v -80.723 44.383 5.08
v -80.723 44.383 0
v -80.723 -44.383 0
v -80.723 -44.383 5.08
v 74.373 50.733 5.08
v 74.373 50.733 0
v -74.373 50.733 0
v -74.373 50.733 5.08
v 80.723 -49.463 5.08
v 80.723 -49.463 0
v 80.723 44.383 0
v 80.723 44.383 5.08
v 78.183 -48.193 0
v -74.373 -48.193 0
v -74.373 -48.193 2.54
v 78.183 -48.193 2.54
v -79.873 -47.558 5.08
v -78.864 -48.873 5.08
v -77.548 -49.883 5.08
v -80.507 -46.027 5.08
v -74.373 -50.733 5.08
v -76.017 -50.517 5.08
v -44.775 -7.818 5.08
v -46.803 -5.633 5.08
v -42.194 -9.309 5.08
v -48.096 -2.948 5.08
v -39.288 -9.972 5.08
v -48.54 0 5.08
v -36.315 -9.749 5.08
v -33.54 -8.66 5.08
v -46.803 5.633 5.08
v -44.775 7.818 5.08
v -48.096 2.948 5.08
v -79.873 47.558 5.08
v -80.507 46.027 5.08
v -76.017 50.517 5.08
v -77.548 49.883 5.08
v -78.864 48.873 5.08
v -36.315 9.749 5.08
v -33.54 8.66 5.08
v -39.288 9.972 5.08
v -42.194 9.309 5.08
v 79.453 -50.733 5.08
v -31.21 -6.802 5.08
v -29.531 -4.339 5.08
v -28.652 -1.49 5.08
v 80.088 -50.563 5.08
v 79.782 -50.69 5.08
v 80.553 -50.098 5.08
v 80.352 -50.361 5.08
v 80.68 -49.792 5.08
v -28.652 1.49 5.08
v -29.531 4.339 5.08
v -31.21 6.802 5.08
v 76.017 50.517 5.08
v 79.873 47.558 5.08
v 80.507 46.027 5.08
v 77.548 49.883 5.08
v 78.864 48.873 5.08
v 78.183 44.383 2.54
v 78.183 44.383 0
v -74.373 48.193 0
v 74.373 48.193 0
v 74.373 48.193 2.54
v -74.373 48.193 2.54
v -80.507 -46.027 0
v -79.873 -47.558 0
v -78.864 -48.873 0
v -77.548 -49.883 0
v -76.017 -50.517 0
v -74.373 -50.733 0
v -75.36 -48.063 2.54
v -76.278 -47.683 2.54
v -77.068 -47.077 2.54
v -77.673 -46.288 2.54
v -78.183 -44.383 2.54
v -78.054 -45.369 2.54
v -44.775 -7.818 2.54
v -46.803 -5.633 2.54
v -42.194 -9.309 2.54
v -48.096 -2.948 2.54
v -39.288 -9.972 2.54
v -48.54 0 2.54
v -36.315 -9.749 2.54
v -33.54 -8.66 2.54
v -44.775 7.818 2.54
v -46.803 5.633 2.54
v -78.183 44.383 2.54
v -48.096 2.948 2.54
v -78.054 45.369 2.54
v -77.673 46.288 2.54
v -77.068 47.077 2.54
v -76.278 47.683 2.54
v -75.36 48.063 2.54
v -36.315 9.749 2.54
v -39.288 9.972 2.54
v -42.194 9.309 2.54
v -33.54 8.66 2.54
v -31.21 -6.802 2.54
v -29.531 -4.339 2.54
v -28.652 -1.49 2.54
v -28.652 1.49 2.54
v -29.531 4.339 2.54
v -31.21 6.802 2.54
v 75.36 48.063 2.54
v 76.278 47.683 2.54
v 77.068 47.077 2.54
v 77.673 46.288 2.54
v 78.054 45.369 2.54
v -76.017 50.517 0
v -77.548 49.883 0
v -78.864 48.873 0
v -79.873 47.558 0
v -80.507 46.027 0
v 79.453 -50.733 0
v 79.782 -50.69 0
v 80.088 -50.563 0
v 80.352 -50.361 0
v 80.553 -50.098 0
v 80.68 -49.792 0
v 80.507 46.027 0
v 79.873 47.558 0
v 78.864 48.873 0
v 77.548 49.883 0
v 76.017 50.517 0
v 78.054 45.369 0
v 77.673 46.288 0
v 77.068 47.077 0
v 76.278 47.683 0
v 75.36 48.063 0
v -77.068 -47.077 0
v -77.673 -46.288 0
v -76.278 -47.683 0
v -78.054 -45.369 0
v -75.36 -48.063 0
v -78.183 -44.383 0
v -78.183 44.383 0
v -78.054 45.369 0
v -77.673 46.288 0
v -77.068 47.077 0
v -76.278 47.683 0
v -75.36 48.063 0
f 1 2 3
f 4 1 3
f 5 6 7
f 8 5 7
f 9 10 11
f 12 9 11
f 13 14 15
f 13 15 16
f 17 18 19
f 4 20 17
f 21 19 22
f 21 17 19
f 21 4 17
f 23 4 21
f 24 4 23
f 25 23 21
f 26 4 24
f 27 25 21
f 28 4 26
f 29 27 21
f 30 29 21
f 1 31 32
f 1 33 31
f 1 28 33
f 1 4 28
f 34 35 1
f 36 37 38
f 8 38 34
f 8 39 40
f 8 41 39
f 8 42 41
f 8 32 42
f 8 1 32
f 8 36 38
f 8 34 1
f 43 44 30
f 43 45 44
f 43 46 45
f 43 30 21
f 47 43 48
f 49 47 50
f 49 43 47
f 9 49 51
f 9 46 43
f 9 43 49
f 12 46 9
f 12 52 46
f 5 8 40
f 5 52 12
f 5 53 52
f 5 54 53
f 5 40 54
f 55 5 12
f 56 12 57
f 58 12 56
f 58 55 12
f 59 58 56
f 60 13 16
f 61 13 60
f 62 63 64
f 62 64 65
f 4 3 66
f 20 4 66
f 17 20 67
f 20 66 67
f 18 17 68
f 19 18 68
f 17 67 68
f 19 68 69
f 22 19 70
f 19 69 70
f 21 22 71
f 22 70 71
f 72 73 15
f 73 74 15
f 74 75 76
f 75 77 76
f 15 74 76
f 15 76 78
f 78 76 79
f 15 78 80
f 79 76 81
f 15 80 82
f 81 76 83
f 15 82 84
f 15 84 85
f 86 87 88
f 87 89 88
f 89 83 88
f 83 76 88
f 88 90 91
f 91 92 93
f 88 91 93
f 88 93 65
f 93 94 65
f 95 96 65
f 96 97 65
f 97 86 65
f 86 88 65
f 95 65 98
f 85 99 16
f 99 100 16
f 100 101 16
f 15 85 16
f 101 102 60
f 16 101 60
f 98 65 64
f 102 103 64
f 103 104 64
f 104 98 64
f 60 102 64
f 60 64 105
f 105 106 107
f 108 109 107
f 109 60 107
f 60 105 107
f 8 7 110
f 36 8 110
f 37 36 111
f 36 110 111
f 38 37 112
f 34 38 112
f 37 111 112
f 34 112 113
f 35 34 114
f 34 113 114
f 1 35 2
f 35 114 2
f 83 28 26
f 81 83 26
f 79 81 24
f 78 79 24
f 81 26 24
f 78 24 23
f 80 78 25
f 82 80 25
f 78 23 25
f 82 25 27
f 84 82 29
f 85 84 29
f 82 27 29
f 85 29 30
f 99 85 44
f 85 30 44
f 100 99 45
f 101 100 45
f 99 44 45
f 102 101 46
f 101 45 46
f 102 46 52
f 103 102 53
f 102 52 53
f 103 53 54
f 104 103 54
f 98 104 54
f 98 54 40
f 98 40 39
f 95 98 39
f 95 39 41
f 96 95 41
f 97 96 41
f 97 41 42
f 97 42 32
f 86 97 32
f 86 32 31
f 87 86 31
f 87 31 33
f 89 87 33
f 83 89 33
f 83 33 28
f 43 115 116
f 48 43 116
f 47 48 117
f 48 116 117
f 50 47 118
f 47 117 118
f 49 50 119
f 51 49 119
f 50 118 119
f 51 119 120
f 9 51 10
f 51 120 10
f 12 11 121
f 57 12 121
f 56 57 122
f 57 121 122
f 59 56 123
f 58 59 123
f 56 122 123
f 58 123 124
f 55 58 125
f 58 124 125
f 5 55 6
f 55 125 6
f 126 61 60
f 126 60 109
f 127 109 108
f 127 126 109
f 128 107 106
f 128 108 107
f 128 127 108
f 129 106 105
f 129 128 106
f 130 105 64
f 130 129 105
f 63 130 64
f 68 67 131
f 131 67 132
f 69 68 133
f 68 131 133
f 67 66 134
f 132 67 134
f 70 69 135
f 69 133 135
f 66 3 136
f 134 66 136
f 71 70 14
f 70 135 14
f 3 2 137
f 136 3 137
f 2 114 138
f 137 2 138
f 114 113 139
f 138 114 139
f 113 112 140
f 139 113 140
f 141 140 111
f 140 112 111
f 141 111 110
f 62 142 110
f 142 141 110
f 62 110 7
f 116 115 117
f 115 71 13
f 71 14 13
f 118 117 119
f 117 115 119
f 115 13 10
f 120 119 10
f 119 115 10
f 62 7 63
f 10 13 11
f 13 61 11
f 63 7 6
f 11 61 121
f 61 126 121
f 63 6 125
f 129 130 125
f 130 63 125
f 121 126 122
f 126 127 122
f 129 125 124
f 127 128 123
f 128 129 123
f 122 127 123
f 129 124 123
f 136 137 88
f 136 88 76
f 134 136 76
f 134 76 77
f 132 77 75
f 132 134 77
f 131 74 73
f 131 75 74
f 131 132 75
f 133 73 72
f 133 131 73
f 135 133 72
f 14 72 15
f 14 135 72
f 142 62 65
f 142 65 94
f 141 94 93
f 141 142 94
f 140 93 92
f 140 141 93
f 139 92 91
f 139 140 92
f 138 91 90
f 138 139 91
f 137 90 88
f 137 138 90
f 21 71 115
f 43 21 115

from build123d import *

# Parameters (mm, degrees)
F1_DEPTH = 5.08
F2_T     = -2.54
F4_D     = 20


with BuildPart() as f1:
    # F0 (on Top) → F1 (new body)
    with BuildSketch(Plane.XY):
        with BuildLine():
            Line((-74.373494, -50.733282), (79.453494, -50.733282))
            ThreePointArc((79.453494, -50.733282), (80.35152, -50.361307), (80.723494, -49.463282))
            Line((80.723494, -49.463282), (80.723494, 44.383282))
            ThreePointArc((80.723494, 44.383282), (78.863622, 48.87341), (74.373494, 50.733282))
            Line((74.373494, 50.733282), (-74.373494, 50.733282))
            ThreePointArc((-74.373494, 50.733282), (-78.863622, 48.87341), (-80.723494, 44.383282))
            Line((-80.723494, 44.383282), (-80.723494, -44.383282))
            ThreePointArc((-80.723494, -44.383282), (-78.863622, -48.87341), (-74.373494, -50.733282))
        make_face()
    extrude(amount=F1_DEPTH)

    # F2
    f2_openings = [f1.faces().sort_by_distance(p)[0] for p in [
        (0.040257, -0.025024, 0),
    ]]
    offset(amount=F2_T, openings=f2_openings)

    # F4 (through all)
    with Locations(Plane(origin=(0, 0, 0), x_dir=(1, 0, 0), z_dir=(0, 0, -1))):
        with Locations((-38.540371, 0)):
            Hole(F4_D / 2)


solid = f1.part
